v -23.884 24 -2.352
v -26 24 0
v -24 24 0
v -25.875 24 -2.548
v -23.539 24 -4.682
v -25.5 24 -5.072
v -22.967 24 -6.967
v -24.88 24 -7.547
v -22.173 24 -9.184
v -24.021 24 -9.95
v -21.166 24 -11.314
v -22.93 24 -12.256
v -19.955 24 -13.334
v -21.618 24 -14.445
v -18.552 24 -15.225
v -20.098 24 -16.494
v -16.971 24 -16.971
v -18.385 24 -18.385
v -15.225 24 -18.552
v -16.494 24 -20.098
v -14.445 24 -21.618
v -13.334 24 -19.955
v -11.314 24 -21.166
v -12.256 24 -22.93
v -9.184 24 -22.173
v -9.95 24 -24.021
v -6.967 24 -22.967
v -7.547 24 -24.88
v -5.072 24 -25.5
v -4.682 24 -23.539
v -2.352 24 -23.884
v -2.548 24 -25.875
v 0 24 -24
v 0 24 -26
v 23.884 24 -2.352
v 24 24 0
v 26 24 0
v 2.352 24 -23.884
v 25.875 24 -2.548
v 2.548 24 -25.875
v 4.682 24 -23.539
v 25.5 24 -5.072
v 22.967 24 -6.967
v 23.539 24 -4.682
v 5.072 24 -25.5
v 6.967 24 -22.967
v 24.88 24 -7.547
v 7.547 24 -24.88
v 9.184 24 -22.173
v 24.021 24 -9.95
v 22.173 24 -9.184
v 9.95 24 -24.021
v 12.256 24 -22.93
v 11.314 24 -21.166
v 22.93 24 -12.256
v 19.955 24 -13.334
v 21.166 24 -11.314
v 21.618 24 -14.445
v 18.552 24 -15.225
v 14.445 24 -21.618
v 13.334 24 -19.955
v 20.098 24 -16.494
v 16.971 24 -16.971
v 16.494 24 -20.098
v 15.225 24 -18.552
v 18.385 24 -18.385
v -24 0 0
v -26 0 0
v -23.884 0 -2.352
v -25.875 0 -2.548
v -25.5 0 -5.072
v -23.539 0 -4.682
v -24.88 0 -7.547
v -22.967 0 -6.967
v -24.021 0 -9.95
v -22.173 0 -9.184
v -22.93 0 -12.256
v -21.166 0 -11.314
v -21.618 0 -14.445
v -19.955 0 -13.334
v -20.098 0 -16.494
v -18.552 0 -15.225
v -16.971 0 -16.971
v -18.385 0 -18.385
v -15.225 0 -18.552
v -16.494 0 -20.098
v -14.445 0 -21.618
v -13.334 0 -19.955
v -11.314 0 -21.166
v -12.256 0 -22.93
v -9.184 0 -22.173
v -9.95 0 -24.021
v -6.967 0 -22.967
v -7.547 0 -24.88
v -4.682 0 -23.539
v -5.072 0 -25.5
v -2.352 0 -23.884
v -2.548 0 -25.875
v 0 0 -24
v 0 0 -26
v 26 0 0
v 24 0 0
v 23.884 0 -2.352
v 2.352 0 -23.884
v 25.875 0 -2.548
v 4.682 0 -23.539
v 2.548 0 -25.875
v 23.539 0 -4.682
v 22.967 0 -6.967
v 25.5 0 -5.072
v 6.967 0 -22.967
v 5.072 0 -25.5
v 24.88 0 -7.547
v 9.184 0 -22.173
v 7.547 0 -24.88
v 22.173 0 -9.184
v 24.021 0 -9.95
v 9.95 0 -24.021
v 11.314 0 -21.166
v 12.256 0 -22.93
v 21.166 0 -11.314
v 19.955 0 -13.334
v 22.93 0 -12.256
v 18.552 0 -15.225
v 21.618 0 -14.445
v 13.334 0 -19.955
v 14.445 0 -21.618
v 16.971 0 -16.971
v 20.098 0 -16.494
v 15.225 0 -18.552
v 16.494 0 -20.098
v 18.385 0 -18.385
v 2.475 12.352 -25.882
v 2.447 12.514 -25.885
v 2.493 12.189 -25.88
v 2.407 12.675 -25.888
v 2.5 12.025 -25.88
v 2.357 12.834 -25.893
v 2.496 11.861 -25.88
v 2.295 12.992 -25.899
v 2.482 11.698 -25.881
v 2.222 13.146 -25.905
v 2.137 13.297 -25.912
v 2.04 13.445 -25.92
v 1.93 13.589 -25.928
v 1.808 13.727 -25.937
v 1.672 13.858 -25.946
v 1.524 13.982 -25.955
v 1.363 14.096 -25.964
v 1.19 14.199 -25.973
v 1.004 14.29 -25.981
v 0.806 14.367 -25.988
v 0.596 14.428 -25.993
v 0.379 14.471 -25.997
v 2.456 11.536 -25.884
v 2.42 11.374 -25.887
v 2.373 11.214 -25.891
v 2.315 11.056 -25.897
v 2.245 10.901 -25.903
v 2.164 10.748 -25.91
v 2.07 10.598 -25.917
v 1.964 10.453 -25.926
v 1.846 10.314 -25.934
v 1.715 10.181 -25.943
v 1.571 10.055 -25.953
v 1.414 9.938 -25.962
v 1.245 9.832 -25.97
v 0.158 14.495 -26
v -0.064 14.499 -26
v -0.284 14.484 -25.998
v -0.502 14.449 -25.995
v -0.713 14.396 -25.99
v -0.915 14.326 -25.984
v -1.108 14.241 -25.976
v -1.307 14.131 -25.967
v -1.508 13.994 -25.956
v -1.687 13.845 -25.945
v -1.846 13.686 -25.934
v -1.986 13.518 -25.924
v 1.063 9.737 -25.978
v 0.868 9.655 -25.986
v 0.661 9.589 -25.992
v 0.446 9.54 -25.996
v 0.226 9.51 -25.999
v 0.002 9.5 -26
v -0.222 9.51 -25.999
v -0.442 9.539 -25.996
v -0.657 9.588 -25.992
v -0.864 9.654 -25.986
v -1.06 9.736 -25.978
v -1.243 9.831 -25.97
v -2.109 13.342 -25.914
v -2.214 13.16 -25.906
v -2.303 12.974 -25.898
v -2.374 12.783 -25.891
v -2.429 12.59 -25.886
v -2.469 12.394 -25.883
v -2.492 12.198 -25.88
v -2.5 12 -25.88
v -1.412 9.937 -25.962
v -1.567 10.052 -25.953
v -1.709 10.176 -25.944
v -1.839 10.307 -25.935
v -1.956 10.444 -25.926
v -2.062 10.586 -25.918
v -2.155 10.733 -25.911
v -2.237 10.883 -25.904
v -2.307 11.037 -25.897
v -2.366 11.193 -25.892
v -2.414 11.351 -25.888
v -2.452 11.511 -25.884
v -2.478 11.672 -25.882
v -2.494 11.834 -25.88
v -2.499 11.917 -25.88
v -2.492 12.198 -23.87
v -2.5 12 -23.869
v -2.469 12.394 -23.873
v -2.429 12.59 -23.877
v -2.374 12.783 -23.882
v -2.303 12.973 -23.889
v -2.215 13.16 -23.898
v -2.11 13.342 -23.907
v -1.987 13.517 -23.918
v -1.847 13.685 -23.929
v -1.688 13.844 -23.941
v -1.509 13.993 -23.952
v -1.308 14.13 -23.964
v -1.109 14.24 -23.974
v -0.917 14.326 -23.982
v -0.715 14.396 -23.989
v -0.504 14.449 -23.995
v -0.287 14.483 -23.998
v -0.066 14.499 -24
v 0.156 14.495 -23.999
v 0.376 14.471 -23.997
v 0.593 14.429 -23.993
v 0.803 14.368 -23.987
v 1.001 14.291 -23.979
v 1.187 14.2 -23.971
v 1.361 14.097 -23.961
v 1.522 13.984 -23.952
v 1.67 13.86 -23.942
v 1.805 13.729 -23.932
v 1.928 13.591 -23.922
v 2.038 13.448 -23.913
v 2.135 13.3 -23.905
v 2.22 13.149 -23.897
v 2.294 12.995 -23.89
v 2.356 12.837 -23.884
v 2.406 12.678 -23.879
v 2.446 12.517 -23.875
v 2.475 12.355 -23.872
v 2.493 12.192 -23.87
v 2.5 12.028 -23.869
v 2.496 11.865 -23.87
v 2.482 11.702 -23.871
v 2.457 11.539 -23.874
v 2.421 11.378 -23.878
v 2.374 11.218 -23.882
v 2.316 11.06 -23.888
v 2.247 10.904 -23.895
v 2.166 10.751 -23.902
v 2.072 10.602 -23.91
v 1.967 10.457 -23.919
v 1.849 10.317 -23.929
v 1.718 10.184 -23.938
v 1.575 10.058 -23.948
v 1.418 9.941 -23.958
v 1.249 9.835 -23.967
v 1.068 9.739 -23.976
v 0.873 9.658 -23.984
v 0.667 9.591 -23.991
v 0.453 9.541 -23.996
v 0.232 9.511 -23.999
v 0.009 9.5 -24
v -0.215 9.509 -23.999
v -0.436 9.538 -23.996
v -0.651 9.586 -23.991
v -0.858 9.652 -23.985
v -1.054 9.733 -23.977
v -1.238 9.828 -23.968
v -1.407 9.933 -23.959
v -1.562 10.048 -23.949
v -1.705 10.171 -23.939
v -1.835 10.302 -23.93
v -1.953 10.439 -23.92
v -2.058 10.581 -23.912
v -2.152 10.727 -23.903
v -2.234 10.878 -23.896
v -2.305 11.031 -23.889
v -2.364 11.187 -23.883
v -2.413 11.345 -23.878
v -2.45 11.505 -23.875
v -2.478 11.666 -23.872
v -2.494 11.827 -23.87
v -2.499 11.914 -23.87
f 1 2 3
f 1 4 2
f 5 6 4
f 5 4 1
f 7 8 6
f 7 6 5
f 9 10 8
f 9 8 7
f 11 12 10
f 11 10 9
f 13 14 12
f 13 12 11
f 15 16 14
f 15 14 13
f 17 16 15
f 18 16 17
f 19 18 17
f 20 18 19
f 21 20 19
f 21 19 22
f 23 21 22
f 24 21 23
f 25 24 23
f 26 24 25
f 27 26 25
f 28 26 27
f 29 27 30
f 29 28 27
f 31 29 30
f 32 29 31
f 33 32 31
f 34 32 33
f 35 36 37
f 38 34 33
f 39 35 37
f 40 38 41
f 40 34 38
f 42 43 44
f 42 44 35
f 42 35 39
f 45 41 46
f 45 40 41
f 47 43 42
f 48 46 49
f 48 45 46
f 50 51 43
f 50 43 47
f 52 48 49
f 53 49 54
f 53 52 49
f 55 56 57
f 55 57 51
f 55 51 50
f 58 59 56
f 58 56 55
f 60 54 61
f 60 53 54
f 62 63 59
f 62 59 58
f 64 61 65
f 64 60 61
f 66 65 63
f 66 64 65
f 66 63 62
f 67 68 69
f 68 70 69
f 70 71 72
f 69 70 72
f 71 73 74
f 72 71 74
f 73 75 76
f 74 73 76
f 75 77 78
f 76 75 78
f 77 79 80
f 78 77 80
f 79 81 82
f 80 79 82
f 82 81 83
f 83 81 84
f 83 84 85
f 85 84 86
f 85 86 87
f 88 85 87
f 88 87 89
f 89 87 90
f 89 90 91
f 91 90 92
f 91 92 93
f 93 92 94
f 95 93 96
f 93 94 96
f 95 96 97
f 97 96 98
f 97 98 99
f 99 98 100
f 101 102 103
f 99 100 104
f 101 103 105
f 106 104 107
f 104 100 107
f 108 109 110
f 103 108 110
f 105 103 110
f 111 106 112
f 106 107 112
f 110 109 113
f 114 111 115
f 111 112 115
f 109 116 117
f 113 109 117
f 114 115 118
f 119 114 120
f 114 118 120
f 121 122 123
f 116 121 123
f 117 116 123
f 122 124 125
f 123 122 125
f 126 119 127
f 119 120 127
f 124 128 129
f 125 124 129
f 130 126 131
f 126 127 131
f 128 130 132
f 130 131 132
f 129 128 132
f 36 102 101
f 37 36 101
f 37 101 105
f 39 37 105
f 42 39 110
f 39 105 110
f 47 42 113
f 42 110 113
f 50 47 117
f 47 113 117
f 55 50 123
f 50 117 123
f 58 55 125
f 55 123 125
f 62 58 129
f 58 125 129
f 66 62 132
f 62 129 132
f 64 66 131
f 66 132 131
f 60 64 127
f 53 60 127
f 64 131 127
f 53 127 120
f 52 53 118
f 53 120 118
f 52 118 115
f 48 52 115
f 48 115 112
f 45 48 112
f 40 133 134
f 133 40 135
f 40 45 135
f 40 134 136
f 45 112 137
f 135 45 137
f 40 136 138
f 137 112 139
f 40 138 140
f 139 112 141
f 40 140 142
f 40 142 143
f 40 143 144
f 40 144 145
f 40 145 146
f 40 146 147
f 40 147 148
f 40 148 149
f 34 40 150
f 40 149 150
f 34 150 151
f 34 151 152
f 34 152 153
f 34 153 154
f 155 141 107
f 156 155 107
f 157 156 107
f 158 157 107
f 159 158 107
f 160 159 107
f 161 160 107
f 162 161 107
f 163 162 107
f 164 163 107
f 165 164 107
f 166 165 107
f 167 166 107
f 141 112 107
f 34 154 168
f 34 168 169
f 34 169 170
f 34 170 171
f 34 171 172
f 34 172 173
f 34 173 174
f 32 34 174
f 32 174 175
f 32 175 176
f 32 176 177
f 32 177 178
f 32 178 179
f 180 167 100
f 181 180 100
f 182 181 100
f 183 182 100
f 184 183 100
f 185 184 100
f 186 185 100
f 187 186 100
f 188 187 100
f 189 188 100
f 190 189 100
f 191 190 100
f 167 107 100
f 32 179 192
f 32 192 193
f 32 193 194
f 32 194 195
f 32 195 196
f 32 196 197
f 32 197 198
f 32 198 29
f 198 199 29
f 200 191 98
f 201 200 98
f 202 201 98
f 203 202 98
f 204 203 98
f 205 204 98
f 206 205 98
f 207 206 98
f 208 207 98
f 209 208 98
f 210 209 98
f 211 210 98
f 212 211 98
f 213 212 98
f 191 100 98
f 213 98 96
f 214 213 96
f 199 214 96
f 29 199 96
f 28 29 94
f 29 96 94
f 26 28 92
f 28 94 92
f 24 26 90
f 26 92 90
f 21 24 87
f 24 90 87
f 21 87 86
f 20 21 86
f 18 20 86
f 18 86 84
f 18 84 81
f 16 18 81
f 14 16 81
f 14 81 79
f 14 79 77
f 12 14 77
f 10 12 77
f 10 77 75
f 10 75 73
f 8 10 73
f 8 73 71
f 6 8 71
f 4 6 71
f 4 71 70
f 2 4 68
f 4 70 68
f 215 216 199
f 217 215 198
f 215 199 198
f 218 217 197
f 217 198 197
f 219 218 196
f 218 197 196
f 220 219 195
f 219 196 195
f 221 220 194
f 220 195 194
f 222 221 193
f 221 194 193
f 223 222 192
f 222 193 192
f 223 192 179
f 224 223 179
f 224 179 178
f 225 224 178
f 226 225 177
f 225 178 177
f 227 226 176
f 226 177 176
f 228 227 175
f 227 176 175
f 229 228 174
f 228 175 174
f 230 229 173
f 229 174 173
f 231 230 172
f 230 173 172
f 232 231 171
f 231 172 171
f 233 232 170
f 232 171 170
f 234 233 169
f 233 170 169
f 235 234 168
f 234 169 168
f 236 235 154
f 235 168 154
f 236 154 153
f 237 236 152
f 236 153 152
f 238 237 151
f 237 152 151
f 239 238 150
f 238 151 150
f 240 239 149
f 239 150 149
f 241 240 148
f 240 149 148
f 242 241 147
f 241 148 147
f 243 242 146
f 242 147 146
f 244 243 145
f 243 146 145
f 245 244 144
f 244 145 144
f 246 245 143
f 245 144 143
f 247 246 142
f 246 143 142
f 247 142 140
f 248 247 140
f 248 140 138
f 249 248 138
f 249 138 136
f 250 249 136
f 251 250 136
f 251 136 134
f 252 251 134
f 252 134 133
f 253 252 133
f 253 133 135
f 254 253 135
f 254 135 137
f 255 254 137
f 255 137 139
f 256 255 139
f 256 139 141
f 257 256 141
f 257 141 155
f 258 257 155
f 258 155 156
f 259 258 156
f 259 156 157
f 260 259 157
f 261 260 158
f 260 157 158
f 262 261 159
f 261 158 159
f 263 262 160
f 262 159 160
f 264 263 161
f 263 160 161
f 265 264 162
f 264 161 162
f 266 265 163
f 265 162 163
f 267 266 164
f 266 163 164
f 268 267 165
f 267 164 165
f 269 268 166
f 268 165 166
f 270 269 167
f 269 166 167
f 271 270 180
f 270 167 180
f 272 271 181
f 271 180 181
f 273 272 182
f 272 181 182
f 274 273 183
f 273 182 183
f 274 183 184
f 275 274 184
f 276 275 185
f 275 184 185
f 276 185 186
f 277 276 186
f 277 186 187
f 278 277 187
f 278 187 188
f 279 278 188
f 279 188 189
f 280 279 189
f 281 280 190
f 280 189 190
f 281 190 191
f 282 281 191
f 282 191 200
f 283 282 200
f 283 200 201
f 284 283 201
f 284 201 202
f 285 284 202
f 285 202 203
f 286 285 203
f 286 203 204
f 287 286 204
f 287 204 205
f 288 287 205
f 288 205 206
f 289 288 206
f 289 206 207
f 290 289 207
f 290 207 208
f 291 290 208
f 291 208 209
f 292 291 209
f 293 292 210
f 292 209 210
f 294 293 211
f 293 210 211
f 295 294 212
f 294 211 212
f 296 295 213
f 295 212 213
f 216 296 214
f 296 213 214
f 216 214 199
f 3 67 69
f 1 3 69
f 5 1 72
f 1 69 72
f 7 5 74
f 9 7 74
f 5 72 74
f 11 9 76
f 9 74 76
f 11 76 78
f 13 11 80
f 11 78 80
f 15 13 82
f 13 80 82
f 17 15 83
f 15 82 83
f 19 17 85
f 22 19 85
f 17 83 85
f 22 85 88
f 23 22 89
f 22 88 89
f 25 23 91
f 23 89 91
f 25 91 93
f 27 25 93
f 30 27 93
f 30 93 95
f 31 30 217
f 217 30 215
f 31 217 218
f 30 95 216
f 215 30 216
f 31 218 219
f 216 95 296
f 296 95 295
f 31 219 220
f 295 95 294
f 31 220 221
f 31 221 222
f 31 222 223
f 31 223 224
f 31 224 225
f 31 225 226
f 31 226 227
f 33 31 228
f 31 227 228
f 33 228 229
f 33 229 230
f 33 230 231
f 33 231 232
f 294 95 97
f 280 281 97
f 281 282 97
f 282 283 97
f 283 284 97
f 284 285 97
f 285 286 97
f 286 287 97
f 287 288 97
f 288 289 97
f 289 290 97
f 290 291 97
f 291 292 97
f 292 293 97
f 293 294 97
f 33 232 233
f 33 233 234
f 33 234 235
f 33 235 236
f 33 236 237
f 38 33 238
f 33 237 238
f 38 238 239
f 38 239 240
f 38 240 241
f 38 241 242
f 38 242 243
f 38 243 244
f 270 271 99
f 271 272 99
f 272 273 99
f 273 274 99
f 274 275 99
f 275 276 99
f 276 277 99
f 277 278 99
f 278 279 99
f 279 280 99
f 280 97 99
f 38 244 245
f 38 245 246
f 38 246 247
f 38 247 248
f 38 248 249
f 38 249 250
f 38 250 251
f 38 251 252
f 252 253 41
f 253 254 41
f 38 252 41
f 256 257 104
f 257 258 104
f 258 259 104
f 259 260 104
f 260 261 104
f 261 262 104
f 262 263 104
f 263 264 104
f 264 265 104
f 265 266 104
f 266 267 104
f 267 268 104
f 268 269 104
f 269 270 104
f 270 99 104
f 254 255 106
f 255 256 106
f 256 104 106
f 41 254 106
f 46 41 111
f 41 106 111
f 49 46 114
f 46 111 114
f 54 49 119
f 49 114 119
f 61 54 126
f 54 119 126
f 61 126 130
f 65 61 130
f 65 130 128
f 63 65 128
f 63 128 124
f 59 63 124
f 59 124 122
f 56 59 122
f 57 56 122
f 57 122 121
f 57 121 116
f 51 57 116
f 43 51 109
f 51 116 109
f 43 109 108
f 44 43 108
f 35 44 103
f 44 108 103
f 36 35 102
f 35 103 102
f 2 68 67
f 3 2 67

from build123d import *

# Parameters (mm, degrees)
EXTRUDE_1_DEPTH                 = 24
HOLE_WIZARD_5_0_5_1_D           = 5
HOLE_WIZARD_5_0_5_1_CSINK_D     = 5.05
HOLE_WIZARD_5_0_5_1_CSINK_ANGLE = 90


with BuildPart() as part:
    # 草图1 → 凸台-拉伸1 (new body)
    with BuildSketch(Plane(origin=(0, 0, 0), x_dir=(1, 0, 0), z_dir=(0, 1, 0))):
        with BuildLine():
            Line((-26, 0), (-24, 0))
            ThreePointArc((-24, 0), (0, 24), (24, 0))
            Line((24, 0), (26, 0))
            ThreePointArc((26, 0), (0, 26), (-26, 0))
        make_face()
    extrude(amount=EXTRUDE_1_DEPTH)

    # Ø5.0 (5) 直径孔1 (through all)
    with Locations(Plane.XY):
        with Locations((0, 12)):
            CounterSinkHole(HOLE_WIZARD_5_0_5_1_D / 2, HOLE_WIZARD_5_0_5_1_CSINK_D / 2, counter_sink_angle=HOLE_WIZARD_5_0_5_1_CSINK_ANGLE)


solid = part.part
